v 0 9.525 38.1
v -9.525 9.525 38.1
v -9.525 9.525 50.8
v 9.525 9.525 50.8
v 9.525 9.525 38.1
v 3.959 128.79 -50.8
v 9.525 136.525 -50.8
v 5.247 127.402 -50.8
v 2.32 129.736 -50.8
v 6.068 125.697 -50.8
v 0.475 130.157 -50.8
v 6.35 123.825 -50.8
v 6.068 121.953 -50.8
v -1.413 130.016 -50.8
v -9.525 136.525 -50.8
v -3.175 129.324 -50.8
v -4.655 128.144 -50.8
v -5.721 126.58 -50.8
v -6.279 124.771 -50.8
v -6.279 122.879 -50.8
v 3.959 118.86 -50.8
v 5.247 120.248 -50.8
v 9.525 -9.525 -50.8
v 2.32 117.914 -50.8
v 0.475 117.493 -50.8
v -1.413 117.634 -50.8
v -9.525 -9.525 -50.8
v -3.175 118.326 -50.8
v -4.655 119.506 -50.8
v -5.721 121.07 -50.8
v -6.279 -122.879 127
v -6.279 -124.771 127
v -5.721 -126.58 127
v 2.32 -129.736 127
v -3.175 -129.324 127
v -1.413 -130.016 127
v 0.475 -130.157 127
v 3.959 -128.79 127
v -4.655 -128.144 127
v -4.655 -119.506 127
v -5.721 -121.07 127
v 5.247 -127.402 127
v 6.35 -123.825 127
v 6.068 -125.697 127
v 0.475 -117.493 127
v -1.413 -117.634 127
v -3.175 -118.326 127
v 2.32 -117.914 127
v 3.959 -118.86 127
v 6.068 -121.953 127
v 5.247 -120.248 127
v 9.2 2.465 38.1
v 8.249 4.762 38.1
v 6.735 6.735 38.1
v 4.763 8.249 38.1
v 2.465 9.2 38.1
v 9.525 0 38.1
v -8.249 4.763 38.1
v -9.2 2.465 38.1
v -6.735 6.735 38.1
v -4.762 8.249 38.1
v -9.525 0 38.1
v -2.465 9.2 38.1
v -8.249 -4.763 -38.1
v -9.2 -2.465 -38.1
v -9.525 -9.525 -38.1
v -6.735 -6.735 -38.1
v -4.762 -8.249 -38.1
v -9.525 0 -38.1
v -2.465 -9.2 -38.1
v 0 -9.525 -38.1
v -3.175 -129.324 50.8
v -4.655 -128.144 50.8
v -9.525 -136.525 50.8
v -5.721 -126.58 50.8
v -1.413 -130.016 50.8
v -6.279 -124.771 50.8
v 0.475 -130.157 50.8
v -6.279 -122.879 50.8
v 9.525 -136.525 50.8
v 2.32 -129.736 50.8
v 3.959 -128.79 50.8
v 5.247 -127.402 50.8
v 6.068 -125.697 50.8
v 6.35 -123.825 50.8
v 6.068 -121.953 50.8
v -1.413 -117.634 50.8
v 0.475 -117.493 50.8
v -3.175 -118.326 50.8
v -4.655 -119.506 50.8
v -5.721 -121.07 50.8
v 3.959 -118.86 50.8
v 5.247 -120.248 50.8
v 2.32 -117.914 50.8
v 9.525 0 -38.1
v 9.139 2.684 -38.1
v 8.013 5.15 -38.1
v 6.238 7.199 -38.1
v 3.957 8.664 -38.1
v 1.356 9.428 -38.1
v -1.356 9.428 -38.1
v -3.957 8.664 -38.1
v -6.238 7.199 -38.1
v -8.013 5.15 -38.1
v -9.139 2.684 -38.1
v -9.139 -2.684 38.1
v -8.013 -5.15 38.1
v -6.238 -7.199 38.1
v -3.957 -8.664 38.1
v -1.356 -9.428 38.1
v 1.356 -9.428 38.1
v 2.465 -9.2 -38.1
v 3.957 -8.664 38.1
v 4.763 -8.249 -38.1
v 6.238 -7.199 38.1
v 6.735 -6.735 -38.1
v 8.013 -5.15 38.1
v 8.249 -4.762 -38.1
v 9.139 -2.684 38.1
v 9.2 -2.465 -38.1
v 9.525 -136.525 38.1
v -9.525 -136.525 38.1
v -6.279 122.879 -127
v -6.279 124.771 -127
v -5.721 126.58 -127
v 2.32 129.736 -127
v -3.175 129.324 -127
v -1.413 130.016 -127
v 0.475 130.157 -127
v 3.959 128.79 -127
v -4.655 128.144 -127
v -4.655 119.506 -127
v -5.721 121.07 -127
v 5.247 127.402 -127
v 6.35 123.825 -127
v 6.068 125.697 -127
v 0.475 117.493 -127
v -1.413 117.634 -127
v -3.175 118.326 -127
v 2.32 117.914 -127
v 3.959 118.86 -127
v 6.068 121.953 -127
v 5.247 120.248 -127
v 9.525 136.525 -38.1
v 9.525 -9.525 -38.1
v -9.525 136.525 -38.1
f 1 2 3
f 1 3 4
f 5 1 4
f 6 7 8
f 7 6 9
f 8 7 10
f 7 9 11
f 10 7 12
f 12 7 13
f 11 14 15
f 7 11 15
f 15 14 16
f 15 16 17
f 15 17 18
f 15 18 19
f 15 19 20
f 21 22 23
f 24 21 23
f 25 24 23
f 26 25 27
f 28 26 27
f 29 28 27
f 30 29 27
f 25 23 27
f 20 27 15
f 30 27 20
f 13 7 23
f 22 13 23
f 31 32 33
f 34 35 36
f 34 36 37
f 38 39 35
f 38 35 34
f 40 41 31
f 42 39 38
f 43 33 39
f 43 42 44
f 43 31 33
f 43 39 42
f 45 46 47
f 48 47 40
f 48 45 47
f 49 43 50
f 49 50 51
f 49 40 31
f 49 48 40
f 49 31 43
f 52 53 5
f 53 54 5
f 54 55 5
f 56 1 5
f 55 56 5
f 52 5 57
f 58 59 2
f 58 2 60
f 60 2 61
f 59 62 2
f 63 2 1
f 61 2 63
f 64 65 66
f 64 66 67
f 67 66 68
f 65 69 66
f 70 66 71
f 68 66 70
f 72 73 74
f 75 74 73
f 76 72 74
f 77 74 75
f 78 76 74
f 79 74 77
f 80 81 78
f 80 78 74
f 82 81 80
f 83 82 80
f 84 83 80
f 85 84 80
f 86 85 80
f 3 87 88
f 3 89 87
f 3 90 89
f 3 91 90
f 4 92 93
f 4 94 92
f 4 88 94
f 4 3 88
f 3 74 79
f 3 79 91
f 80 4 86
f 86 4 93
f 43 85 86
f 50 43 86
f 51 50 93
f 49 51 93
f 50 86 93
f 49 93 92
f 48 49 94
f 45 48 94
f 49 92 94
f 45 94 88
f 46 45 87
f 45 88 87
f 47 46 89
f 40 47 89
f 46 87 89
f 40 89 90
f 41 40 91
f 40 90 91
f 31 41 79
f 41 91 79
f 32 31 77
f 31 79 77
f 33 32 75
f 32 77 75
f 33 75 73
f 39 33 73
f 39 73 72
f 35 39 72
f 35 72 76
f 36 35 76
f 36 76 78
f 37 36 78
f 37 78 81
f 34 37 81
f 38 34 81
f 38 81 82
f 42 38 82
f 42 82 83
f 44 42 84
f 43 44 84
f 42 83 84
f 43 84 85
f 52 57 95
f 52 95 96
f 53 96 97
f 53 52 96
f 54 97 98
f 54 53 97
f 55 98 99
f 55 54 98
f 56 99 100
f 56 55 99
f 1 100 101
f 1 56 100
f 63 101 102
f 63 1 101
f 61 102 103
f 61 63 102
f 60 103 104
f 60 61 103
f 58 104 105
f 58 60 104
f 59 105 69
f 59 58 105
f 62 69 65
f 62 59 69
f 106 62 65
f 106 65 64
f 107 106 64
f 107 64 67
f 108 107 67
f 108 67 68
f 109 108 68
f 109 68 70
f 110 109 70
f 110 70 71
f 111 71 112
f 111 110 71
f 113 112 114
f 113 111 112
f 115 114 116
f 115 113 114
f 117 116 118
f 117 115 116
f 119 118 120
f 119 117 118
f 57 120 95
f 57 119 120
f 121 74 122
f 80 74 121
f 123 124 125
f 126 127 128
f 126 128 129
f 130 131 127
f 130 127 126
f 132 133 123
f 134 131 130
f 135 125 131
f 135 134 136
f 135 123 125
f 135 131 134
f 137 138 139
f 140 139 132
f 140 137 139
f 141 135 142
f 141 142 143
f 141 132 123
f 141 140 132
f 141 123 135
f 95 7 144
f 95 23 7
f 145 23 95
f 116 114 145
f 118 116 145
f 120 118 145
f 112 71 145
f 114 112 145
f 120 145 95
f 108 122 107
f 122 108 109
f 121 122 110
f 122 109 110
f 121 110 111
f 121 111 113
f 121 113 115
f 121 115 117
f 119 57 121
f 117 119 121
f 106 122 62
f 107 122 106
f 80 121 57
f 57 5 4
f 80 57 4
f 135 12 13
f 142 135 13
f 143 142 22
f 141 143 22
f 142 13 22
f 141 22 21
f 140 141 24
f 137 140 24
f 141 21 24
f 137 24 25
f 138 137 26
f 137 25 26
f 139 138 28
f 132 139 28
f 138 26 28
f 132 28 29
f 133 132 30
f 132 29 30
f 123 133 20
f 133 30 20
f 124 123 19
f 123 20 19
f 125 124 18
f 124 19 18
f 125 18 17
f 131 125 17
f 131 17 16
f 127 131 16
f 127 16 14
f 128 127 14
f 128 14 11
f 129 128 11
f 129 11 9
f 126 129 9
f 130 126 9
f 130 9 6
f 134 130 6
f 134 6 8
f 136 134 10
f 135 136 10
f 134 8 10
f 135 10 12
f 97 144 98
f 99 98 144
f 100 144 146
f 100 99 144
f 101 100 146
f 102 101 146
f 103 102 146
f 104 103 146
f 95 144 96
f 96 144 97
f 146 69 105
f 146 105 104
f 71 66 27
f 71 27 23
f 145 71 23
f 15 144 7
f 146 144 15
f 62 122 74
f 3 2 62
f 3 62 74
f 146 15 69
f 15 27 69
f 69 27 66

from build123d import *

# Parameters (mm, degrees)
F0_R      = 9.525
F1_DEPTH  = 38.1
F2_W      = 19.05
F2_H      = 19.05
F3_DEPTH  = 12.7
F4_W      = 19.05
F4_H      = 12.7
F5_DEPTH  = 127
F6_W      = 19.05
F6_H      = 19.05
F7_DEPTH  = 12.7
F8_W      = 19.05
F8_H      = 12.7
F9_DEPTH  = 127
F10_R     = 6.35
F11_DEPTH = 76.2
F12_R     = 6.35
F13_DEPTH = 76.2


with BuildPart() as f1:
    # F0 (on Top) → F1 (new body, symmetric)
    with BuildSketch(Plane.XY):
        Circle(F0_R)
    extrude(amount=F1_DEPTH, both=True)

    # F2 (on face) → F3 (join)
    with BuildSketch(Plane.XY.offset(38.1)):
        Rectangle(F2_W, F2_H)
    extrude(amount=F3_DEPTH)

    # F4 (on face) → F5 (join)
    with BuildSketch(Plane.XZ.offset(9.525)):
        with Locations((0, 44.45)):
            Rectangle(F4_W, F4_H)
    extrude(amount=F5_DEPTH)

    # F6 (on face) → F7 (join)
    with BuildSketch(Plane(origin=(0, 0, -38.1), x_dir=(1, 0, 0), z_dir=(0, 0, -1))):
        Rectangle(F6_W, F6_H)
    extrude(amount=F7_DEPTH)

    # F8 (on face) → F9 (join)
    with BuildSketch(Plane(origin=(0, 9.525, 0), x_dir=(-1, 0, 0), z_dir=(0, 1, 0))):
        with Locations((0, -44.45)):
            Rectangle(F8_W, F8_H)
    extrude(amount=F9_DEPTH)

    # F10 (on face) → F11 (join)
    with BuildSketch(Plane.XY.offset(50.8)):
        with Locations((0, -123.825)):
            Circle(F10_R)
    extrude(amount=F11_DEPTH)

    # F12 (on face) → F13 (join)
    with BuildSketch(Plane(origin=(0, 0, -50.8), x_dir=(1, 0, 0), z_dir=(0, 0, -1))):
        with Locations((0, -123.825)):
            Circle(F12_R)
    extrude(amount=F13_DEPTH)


solid = f1.part
